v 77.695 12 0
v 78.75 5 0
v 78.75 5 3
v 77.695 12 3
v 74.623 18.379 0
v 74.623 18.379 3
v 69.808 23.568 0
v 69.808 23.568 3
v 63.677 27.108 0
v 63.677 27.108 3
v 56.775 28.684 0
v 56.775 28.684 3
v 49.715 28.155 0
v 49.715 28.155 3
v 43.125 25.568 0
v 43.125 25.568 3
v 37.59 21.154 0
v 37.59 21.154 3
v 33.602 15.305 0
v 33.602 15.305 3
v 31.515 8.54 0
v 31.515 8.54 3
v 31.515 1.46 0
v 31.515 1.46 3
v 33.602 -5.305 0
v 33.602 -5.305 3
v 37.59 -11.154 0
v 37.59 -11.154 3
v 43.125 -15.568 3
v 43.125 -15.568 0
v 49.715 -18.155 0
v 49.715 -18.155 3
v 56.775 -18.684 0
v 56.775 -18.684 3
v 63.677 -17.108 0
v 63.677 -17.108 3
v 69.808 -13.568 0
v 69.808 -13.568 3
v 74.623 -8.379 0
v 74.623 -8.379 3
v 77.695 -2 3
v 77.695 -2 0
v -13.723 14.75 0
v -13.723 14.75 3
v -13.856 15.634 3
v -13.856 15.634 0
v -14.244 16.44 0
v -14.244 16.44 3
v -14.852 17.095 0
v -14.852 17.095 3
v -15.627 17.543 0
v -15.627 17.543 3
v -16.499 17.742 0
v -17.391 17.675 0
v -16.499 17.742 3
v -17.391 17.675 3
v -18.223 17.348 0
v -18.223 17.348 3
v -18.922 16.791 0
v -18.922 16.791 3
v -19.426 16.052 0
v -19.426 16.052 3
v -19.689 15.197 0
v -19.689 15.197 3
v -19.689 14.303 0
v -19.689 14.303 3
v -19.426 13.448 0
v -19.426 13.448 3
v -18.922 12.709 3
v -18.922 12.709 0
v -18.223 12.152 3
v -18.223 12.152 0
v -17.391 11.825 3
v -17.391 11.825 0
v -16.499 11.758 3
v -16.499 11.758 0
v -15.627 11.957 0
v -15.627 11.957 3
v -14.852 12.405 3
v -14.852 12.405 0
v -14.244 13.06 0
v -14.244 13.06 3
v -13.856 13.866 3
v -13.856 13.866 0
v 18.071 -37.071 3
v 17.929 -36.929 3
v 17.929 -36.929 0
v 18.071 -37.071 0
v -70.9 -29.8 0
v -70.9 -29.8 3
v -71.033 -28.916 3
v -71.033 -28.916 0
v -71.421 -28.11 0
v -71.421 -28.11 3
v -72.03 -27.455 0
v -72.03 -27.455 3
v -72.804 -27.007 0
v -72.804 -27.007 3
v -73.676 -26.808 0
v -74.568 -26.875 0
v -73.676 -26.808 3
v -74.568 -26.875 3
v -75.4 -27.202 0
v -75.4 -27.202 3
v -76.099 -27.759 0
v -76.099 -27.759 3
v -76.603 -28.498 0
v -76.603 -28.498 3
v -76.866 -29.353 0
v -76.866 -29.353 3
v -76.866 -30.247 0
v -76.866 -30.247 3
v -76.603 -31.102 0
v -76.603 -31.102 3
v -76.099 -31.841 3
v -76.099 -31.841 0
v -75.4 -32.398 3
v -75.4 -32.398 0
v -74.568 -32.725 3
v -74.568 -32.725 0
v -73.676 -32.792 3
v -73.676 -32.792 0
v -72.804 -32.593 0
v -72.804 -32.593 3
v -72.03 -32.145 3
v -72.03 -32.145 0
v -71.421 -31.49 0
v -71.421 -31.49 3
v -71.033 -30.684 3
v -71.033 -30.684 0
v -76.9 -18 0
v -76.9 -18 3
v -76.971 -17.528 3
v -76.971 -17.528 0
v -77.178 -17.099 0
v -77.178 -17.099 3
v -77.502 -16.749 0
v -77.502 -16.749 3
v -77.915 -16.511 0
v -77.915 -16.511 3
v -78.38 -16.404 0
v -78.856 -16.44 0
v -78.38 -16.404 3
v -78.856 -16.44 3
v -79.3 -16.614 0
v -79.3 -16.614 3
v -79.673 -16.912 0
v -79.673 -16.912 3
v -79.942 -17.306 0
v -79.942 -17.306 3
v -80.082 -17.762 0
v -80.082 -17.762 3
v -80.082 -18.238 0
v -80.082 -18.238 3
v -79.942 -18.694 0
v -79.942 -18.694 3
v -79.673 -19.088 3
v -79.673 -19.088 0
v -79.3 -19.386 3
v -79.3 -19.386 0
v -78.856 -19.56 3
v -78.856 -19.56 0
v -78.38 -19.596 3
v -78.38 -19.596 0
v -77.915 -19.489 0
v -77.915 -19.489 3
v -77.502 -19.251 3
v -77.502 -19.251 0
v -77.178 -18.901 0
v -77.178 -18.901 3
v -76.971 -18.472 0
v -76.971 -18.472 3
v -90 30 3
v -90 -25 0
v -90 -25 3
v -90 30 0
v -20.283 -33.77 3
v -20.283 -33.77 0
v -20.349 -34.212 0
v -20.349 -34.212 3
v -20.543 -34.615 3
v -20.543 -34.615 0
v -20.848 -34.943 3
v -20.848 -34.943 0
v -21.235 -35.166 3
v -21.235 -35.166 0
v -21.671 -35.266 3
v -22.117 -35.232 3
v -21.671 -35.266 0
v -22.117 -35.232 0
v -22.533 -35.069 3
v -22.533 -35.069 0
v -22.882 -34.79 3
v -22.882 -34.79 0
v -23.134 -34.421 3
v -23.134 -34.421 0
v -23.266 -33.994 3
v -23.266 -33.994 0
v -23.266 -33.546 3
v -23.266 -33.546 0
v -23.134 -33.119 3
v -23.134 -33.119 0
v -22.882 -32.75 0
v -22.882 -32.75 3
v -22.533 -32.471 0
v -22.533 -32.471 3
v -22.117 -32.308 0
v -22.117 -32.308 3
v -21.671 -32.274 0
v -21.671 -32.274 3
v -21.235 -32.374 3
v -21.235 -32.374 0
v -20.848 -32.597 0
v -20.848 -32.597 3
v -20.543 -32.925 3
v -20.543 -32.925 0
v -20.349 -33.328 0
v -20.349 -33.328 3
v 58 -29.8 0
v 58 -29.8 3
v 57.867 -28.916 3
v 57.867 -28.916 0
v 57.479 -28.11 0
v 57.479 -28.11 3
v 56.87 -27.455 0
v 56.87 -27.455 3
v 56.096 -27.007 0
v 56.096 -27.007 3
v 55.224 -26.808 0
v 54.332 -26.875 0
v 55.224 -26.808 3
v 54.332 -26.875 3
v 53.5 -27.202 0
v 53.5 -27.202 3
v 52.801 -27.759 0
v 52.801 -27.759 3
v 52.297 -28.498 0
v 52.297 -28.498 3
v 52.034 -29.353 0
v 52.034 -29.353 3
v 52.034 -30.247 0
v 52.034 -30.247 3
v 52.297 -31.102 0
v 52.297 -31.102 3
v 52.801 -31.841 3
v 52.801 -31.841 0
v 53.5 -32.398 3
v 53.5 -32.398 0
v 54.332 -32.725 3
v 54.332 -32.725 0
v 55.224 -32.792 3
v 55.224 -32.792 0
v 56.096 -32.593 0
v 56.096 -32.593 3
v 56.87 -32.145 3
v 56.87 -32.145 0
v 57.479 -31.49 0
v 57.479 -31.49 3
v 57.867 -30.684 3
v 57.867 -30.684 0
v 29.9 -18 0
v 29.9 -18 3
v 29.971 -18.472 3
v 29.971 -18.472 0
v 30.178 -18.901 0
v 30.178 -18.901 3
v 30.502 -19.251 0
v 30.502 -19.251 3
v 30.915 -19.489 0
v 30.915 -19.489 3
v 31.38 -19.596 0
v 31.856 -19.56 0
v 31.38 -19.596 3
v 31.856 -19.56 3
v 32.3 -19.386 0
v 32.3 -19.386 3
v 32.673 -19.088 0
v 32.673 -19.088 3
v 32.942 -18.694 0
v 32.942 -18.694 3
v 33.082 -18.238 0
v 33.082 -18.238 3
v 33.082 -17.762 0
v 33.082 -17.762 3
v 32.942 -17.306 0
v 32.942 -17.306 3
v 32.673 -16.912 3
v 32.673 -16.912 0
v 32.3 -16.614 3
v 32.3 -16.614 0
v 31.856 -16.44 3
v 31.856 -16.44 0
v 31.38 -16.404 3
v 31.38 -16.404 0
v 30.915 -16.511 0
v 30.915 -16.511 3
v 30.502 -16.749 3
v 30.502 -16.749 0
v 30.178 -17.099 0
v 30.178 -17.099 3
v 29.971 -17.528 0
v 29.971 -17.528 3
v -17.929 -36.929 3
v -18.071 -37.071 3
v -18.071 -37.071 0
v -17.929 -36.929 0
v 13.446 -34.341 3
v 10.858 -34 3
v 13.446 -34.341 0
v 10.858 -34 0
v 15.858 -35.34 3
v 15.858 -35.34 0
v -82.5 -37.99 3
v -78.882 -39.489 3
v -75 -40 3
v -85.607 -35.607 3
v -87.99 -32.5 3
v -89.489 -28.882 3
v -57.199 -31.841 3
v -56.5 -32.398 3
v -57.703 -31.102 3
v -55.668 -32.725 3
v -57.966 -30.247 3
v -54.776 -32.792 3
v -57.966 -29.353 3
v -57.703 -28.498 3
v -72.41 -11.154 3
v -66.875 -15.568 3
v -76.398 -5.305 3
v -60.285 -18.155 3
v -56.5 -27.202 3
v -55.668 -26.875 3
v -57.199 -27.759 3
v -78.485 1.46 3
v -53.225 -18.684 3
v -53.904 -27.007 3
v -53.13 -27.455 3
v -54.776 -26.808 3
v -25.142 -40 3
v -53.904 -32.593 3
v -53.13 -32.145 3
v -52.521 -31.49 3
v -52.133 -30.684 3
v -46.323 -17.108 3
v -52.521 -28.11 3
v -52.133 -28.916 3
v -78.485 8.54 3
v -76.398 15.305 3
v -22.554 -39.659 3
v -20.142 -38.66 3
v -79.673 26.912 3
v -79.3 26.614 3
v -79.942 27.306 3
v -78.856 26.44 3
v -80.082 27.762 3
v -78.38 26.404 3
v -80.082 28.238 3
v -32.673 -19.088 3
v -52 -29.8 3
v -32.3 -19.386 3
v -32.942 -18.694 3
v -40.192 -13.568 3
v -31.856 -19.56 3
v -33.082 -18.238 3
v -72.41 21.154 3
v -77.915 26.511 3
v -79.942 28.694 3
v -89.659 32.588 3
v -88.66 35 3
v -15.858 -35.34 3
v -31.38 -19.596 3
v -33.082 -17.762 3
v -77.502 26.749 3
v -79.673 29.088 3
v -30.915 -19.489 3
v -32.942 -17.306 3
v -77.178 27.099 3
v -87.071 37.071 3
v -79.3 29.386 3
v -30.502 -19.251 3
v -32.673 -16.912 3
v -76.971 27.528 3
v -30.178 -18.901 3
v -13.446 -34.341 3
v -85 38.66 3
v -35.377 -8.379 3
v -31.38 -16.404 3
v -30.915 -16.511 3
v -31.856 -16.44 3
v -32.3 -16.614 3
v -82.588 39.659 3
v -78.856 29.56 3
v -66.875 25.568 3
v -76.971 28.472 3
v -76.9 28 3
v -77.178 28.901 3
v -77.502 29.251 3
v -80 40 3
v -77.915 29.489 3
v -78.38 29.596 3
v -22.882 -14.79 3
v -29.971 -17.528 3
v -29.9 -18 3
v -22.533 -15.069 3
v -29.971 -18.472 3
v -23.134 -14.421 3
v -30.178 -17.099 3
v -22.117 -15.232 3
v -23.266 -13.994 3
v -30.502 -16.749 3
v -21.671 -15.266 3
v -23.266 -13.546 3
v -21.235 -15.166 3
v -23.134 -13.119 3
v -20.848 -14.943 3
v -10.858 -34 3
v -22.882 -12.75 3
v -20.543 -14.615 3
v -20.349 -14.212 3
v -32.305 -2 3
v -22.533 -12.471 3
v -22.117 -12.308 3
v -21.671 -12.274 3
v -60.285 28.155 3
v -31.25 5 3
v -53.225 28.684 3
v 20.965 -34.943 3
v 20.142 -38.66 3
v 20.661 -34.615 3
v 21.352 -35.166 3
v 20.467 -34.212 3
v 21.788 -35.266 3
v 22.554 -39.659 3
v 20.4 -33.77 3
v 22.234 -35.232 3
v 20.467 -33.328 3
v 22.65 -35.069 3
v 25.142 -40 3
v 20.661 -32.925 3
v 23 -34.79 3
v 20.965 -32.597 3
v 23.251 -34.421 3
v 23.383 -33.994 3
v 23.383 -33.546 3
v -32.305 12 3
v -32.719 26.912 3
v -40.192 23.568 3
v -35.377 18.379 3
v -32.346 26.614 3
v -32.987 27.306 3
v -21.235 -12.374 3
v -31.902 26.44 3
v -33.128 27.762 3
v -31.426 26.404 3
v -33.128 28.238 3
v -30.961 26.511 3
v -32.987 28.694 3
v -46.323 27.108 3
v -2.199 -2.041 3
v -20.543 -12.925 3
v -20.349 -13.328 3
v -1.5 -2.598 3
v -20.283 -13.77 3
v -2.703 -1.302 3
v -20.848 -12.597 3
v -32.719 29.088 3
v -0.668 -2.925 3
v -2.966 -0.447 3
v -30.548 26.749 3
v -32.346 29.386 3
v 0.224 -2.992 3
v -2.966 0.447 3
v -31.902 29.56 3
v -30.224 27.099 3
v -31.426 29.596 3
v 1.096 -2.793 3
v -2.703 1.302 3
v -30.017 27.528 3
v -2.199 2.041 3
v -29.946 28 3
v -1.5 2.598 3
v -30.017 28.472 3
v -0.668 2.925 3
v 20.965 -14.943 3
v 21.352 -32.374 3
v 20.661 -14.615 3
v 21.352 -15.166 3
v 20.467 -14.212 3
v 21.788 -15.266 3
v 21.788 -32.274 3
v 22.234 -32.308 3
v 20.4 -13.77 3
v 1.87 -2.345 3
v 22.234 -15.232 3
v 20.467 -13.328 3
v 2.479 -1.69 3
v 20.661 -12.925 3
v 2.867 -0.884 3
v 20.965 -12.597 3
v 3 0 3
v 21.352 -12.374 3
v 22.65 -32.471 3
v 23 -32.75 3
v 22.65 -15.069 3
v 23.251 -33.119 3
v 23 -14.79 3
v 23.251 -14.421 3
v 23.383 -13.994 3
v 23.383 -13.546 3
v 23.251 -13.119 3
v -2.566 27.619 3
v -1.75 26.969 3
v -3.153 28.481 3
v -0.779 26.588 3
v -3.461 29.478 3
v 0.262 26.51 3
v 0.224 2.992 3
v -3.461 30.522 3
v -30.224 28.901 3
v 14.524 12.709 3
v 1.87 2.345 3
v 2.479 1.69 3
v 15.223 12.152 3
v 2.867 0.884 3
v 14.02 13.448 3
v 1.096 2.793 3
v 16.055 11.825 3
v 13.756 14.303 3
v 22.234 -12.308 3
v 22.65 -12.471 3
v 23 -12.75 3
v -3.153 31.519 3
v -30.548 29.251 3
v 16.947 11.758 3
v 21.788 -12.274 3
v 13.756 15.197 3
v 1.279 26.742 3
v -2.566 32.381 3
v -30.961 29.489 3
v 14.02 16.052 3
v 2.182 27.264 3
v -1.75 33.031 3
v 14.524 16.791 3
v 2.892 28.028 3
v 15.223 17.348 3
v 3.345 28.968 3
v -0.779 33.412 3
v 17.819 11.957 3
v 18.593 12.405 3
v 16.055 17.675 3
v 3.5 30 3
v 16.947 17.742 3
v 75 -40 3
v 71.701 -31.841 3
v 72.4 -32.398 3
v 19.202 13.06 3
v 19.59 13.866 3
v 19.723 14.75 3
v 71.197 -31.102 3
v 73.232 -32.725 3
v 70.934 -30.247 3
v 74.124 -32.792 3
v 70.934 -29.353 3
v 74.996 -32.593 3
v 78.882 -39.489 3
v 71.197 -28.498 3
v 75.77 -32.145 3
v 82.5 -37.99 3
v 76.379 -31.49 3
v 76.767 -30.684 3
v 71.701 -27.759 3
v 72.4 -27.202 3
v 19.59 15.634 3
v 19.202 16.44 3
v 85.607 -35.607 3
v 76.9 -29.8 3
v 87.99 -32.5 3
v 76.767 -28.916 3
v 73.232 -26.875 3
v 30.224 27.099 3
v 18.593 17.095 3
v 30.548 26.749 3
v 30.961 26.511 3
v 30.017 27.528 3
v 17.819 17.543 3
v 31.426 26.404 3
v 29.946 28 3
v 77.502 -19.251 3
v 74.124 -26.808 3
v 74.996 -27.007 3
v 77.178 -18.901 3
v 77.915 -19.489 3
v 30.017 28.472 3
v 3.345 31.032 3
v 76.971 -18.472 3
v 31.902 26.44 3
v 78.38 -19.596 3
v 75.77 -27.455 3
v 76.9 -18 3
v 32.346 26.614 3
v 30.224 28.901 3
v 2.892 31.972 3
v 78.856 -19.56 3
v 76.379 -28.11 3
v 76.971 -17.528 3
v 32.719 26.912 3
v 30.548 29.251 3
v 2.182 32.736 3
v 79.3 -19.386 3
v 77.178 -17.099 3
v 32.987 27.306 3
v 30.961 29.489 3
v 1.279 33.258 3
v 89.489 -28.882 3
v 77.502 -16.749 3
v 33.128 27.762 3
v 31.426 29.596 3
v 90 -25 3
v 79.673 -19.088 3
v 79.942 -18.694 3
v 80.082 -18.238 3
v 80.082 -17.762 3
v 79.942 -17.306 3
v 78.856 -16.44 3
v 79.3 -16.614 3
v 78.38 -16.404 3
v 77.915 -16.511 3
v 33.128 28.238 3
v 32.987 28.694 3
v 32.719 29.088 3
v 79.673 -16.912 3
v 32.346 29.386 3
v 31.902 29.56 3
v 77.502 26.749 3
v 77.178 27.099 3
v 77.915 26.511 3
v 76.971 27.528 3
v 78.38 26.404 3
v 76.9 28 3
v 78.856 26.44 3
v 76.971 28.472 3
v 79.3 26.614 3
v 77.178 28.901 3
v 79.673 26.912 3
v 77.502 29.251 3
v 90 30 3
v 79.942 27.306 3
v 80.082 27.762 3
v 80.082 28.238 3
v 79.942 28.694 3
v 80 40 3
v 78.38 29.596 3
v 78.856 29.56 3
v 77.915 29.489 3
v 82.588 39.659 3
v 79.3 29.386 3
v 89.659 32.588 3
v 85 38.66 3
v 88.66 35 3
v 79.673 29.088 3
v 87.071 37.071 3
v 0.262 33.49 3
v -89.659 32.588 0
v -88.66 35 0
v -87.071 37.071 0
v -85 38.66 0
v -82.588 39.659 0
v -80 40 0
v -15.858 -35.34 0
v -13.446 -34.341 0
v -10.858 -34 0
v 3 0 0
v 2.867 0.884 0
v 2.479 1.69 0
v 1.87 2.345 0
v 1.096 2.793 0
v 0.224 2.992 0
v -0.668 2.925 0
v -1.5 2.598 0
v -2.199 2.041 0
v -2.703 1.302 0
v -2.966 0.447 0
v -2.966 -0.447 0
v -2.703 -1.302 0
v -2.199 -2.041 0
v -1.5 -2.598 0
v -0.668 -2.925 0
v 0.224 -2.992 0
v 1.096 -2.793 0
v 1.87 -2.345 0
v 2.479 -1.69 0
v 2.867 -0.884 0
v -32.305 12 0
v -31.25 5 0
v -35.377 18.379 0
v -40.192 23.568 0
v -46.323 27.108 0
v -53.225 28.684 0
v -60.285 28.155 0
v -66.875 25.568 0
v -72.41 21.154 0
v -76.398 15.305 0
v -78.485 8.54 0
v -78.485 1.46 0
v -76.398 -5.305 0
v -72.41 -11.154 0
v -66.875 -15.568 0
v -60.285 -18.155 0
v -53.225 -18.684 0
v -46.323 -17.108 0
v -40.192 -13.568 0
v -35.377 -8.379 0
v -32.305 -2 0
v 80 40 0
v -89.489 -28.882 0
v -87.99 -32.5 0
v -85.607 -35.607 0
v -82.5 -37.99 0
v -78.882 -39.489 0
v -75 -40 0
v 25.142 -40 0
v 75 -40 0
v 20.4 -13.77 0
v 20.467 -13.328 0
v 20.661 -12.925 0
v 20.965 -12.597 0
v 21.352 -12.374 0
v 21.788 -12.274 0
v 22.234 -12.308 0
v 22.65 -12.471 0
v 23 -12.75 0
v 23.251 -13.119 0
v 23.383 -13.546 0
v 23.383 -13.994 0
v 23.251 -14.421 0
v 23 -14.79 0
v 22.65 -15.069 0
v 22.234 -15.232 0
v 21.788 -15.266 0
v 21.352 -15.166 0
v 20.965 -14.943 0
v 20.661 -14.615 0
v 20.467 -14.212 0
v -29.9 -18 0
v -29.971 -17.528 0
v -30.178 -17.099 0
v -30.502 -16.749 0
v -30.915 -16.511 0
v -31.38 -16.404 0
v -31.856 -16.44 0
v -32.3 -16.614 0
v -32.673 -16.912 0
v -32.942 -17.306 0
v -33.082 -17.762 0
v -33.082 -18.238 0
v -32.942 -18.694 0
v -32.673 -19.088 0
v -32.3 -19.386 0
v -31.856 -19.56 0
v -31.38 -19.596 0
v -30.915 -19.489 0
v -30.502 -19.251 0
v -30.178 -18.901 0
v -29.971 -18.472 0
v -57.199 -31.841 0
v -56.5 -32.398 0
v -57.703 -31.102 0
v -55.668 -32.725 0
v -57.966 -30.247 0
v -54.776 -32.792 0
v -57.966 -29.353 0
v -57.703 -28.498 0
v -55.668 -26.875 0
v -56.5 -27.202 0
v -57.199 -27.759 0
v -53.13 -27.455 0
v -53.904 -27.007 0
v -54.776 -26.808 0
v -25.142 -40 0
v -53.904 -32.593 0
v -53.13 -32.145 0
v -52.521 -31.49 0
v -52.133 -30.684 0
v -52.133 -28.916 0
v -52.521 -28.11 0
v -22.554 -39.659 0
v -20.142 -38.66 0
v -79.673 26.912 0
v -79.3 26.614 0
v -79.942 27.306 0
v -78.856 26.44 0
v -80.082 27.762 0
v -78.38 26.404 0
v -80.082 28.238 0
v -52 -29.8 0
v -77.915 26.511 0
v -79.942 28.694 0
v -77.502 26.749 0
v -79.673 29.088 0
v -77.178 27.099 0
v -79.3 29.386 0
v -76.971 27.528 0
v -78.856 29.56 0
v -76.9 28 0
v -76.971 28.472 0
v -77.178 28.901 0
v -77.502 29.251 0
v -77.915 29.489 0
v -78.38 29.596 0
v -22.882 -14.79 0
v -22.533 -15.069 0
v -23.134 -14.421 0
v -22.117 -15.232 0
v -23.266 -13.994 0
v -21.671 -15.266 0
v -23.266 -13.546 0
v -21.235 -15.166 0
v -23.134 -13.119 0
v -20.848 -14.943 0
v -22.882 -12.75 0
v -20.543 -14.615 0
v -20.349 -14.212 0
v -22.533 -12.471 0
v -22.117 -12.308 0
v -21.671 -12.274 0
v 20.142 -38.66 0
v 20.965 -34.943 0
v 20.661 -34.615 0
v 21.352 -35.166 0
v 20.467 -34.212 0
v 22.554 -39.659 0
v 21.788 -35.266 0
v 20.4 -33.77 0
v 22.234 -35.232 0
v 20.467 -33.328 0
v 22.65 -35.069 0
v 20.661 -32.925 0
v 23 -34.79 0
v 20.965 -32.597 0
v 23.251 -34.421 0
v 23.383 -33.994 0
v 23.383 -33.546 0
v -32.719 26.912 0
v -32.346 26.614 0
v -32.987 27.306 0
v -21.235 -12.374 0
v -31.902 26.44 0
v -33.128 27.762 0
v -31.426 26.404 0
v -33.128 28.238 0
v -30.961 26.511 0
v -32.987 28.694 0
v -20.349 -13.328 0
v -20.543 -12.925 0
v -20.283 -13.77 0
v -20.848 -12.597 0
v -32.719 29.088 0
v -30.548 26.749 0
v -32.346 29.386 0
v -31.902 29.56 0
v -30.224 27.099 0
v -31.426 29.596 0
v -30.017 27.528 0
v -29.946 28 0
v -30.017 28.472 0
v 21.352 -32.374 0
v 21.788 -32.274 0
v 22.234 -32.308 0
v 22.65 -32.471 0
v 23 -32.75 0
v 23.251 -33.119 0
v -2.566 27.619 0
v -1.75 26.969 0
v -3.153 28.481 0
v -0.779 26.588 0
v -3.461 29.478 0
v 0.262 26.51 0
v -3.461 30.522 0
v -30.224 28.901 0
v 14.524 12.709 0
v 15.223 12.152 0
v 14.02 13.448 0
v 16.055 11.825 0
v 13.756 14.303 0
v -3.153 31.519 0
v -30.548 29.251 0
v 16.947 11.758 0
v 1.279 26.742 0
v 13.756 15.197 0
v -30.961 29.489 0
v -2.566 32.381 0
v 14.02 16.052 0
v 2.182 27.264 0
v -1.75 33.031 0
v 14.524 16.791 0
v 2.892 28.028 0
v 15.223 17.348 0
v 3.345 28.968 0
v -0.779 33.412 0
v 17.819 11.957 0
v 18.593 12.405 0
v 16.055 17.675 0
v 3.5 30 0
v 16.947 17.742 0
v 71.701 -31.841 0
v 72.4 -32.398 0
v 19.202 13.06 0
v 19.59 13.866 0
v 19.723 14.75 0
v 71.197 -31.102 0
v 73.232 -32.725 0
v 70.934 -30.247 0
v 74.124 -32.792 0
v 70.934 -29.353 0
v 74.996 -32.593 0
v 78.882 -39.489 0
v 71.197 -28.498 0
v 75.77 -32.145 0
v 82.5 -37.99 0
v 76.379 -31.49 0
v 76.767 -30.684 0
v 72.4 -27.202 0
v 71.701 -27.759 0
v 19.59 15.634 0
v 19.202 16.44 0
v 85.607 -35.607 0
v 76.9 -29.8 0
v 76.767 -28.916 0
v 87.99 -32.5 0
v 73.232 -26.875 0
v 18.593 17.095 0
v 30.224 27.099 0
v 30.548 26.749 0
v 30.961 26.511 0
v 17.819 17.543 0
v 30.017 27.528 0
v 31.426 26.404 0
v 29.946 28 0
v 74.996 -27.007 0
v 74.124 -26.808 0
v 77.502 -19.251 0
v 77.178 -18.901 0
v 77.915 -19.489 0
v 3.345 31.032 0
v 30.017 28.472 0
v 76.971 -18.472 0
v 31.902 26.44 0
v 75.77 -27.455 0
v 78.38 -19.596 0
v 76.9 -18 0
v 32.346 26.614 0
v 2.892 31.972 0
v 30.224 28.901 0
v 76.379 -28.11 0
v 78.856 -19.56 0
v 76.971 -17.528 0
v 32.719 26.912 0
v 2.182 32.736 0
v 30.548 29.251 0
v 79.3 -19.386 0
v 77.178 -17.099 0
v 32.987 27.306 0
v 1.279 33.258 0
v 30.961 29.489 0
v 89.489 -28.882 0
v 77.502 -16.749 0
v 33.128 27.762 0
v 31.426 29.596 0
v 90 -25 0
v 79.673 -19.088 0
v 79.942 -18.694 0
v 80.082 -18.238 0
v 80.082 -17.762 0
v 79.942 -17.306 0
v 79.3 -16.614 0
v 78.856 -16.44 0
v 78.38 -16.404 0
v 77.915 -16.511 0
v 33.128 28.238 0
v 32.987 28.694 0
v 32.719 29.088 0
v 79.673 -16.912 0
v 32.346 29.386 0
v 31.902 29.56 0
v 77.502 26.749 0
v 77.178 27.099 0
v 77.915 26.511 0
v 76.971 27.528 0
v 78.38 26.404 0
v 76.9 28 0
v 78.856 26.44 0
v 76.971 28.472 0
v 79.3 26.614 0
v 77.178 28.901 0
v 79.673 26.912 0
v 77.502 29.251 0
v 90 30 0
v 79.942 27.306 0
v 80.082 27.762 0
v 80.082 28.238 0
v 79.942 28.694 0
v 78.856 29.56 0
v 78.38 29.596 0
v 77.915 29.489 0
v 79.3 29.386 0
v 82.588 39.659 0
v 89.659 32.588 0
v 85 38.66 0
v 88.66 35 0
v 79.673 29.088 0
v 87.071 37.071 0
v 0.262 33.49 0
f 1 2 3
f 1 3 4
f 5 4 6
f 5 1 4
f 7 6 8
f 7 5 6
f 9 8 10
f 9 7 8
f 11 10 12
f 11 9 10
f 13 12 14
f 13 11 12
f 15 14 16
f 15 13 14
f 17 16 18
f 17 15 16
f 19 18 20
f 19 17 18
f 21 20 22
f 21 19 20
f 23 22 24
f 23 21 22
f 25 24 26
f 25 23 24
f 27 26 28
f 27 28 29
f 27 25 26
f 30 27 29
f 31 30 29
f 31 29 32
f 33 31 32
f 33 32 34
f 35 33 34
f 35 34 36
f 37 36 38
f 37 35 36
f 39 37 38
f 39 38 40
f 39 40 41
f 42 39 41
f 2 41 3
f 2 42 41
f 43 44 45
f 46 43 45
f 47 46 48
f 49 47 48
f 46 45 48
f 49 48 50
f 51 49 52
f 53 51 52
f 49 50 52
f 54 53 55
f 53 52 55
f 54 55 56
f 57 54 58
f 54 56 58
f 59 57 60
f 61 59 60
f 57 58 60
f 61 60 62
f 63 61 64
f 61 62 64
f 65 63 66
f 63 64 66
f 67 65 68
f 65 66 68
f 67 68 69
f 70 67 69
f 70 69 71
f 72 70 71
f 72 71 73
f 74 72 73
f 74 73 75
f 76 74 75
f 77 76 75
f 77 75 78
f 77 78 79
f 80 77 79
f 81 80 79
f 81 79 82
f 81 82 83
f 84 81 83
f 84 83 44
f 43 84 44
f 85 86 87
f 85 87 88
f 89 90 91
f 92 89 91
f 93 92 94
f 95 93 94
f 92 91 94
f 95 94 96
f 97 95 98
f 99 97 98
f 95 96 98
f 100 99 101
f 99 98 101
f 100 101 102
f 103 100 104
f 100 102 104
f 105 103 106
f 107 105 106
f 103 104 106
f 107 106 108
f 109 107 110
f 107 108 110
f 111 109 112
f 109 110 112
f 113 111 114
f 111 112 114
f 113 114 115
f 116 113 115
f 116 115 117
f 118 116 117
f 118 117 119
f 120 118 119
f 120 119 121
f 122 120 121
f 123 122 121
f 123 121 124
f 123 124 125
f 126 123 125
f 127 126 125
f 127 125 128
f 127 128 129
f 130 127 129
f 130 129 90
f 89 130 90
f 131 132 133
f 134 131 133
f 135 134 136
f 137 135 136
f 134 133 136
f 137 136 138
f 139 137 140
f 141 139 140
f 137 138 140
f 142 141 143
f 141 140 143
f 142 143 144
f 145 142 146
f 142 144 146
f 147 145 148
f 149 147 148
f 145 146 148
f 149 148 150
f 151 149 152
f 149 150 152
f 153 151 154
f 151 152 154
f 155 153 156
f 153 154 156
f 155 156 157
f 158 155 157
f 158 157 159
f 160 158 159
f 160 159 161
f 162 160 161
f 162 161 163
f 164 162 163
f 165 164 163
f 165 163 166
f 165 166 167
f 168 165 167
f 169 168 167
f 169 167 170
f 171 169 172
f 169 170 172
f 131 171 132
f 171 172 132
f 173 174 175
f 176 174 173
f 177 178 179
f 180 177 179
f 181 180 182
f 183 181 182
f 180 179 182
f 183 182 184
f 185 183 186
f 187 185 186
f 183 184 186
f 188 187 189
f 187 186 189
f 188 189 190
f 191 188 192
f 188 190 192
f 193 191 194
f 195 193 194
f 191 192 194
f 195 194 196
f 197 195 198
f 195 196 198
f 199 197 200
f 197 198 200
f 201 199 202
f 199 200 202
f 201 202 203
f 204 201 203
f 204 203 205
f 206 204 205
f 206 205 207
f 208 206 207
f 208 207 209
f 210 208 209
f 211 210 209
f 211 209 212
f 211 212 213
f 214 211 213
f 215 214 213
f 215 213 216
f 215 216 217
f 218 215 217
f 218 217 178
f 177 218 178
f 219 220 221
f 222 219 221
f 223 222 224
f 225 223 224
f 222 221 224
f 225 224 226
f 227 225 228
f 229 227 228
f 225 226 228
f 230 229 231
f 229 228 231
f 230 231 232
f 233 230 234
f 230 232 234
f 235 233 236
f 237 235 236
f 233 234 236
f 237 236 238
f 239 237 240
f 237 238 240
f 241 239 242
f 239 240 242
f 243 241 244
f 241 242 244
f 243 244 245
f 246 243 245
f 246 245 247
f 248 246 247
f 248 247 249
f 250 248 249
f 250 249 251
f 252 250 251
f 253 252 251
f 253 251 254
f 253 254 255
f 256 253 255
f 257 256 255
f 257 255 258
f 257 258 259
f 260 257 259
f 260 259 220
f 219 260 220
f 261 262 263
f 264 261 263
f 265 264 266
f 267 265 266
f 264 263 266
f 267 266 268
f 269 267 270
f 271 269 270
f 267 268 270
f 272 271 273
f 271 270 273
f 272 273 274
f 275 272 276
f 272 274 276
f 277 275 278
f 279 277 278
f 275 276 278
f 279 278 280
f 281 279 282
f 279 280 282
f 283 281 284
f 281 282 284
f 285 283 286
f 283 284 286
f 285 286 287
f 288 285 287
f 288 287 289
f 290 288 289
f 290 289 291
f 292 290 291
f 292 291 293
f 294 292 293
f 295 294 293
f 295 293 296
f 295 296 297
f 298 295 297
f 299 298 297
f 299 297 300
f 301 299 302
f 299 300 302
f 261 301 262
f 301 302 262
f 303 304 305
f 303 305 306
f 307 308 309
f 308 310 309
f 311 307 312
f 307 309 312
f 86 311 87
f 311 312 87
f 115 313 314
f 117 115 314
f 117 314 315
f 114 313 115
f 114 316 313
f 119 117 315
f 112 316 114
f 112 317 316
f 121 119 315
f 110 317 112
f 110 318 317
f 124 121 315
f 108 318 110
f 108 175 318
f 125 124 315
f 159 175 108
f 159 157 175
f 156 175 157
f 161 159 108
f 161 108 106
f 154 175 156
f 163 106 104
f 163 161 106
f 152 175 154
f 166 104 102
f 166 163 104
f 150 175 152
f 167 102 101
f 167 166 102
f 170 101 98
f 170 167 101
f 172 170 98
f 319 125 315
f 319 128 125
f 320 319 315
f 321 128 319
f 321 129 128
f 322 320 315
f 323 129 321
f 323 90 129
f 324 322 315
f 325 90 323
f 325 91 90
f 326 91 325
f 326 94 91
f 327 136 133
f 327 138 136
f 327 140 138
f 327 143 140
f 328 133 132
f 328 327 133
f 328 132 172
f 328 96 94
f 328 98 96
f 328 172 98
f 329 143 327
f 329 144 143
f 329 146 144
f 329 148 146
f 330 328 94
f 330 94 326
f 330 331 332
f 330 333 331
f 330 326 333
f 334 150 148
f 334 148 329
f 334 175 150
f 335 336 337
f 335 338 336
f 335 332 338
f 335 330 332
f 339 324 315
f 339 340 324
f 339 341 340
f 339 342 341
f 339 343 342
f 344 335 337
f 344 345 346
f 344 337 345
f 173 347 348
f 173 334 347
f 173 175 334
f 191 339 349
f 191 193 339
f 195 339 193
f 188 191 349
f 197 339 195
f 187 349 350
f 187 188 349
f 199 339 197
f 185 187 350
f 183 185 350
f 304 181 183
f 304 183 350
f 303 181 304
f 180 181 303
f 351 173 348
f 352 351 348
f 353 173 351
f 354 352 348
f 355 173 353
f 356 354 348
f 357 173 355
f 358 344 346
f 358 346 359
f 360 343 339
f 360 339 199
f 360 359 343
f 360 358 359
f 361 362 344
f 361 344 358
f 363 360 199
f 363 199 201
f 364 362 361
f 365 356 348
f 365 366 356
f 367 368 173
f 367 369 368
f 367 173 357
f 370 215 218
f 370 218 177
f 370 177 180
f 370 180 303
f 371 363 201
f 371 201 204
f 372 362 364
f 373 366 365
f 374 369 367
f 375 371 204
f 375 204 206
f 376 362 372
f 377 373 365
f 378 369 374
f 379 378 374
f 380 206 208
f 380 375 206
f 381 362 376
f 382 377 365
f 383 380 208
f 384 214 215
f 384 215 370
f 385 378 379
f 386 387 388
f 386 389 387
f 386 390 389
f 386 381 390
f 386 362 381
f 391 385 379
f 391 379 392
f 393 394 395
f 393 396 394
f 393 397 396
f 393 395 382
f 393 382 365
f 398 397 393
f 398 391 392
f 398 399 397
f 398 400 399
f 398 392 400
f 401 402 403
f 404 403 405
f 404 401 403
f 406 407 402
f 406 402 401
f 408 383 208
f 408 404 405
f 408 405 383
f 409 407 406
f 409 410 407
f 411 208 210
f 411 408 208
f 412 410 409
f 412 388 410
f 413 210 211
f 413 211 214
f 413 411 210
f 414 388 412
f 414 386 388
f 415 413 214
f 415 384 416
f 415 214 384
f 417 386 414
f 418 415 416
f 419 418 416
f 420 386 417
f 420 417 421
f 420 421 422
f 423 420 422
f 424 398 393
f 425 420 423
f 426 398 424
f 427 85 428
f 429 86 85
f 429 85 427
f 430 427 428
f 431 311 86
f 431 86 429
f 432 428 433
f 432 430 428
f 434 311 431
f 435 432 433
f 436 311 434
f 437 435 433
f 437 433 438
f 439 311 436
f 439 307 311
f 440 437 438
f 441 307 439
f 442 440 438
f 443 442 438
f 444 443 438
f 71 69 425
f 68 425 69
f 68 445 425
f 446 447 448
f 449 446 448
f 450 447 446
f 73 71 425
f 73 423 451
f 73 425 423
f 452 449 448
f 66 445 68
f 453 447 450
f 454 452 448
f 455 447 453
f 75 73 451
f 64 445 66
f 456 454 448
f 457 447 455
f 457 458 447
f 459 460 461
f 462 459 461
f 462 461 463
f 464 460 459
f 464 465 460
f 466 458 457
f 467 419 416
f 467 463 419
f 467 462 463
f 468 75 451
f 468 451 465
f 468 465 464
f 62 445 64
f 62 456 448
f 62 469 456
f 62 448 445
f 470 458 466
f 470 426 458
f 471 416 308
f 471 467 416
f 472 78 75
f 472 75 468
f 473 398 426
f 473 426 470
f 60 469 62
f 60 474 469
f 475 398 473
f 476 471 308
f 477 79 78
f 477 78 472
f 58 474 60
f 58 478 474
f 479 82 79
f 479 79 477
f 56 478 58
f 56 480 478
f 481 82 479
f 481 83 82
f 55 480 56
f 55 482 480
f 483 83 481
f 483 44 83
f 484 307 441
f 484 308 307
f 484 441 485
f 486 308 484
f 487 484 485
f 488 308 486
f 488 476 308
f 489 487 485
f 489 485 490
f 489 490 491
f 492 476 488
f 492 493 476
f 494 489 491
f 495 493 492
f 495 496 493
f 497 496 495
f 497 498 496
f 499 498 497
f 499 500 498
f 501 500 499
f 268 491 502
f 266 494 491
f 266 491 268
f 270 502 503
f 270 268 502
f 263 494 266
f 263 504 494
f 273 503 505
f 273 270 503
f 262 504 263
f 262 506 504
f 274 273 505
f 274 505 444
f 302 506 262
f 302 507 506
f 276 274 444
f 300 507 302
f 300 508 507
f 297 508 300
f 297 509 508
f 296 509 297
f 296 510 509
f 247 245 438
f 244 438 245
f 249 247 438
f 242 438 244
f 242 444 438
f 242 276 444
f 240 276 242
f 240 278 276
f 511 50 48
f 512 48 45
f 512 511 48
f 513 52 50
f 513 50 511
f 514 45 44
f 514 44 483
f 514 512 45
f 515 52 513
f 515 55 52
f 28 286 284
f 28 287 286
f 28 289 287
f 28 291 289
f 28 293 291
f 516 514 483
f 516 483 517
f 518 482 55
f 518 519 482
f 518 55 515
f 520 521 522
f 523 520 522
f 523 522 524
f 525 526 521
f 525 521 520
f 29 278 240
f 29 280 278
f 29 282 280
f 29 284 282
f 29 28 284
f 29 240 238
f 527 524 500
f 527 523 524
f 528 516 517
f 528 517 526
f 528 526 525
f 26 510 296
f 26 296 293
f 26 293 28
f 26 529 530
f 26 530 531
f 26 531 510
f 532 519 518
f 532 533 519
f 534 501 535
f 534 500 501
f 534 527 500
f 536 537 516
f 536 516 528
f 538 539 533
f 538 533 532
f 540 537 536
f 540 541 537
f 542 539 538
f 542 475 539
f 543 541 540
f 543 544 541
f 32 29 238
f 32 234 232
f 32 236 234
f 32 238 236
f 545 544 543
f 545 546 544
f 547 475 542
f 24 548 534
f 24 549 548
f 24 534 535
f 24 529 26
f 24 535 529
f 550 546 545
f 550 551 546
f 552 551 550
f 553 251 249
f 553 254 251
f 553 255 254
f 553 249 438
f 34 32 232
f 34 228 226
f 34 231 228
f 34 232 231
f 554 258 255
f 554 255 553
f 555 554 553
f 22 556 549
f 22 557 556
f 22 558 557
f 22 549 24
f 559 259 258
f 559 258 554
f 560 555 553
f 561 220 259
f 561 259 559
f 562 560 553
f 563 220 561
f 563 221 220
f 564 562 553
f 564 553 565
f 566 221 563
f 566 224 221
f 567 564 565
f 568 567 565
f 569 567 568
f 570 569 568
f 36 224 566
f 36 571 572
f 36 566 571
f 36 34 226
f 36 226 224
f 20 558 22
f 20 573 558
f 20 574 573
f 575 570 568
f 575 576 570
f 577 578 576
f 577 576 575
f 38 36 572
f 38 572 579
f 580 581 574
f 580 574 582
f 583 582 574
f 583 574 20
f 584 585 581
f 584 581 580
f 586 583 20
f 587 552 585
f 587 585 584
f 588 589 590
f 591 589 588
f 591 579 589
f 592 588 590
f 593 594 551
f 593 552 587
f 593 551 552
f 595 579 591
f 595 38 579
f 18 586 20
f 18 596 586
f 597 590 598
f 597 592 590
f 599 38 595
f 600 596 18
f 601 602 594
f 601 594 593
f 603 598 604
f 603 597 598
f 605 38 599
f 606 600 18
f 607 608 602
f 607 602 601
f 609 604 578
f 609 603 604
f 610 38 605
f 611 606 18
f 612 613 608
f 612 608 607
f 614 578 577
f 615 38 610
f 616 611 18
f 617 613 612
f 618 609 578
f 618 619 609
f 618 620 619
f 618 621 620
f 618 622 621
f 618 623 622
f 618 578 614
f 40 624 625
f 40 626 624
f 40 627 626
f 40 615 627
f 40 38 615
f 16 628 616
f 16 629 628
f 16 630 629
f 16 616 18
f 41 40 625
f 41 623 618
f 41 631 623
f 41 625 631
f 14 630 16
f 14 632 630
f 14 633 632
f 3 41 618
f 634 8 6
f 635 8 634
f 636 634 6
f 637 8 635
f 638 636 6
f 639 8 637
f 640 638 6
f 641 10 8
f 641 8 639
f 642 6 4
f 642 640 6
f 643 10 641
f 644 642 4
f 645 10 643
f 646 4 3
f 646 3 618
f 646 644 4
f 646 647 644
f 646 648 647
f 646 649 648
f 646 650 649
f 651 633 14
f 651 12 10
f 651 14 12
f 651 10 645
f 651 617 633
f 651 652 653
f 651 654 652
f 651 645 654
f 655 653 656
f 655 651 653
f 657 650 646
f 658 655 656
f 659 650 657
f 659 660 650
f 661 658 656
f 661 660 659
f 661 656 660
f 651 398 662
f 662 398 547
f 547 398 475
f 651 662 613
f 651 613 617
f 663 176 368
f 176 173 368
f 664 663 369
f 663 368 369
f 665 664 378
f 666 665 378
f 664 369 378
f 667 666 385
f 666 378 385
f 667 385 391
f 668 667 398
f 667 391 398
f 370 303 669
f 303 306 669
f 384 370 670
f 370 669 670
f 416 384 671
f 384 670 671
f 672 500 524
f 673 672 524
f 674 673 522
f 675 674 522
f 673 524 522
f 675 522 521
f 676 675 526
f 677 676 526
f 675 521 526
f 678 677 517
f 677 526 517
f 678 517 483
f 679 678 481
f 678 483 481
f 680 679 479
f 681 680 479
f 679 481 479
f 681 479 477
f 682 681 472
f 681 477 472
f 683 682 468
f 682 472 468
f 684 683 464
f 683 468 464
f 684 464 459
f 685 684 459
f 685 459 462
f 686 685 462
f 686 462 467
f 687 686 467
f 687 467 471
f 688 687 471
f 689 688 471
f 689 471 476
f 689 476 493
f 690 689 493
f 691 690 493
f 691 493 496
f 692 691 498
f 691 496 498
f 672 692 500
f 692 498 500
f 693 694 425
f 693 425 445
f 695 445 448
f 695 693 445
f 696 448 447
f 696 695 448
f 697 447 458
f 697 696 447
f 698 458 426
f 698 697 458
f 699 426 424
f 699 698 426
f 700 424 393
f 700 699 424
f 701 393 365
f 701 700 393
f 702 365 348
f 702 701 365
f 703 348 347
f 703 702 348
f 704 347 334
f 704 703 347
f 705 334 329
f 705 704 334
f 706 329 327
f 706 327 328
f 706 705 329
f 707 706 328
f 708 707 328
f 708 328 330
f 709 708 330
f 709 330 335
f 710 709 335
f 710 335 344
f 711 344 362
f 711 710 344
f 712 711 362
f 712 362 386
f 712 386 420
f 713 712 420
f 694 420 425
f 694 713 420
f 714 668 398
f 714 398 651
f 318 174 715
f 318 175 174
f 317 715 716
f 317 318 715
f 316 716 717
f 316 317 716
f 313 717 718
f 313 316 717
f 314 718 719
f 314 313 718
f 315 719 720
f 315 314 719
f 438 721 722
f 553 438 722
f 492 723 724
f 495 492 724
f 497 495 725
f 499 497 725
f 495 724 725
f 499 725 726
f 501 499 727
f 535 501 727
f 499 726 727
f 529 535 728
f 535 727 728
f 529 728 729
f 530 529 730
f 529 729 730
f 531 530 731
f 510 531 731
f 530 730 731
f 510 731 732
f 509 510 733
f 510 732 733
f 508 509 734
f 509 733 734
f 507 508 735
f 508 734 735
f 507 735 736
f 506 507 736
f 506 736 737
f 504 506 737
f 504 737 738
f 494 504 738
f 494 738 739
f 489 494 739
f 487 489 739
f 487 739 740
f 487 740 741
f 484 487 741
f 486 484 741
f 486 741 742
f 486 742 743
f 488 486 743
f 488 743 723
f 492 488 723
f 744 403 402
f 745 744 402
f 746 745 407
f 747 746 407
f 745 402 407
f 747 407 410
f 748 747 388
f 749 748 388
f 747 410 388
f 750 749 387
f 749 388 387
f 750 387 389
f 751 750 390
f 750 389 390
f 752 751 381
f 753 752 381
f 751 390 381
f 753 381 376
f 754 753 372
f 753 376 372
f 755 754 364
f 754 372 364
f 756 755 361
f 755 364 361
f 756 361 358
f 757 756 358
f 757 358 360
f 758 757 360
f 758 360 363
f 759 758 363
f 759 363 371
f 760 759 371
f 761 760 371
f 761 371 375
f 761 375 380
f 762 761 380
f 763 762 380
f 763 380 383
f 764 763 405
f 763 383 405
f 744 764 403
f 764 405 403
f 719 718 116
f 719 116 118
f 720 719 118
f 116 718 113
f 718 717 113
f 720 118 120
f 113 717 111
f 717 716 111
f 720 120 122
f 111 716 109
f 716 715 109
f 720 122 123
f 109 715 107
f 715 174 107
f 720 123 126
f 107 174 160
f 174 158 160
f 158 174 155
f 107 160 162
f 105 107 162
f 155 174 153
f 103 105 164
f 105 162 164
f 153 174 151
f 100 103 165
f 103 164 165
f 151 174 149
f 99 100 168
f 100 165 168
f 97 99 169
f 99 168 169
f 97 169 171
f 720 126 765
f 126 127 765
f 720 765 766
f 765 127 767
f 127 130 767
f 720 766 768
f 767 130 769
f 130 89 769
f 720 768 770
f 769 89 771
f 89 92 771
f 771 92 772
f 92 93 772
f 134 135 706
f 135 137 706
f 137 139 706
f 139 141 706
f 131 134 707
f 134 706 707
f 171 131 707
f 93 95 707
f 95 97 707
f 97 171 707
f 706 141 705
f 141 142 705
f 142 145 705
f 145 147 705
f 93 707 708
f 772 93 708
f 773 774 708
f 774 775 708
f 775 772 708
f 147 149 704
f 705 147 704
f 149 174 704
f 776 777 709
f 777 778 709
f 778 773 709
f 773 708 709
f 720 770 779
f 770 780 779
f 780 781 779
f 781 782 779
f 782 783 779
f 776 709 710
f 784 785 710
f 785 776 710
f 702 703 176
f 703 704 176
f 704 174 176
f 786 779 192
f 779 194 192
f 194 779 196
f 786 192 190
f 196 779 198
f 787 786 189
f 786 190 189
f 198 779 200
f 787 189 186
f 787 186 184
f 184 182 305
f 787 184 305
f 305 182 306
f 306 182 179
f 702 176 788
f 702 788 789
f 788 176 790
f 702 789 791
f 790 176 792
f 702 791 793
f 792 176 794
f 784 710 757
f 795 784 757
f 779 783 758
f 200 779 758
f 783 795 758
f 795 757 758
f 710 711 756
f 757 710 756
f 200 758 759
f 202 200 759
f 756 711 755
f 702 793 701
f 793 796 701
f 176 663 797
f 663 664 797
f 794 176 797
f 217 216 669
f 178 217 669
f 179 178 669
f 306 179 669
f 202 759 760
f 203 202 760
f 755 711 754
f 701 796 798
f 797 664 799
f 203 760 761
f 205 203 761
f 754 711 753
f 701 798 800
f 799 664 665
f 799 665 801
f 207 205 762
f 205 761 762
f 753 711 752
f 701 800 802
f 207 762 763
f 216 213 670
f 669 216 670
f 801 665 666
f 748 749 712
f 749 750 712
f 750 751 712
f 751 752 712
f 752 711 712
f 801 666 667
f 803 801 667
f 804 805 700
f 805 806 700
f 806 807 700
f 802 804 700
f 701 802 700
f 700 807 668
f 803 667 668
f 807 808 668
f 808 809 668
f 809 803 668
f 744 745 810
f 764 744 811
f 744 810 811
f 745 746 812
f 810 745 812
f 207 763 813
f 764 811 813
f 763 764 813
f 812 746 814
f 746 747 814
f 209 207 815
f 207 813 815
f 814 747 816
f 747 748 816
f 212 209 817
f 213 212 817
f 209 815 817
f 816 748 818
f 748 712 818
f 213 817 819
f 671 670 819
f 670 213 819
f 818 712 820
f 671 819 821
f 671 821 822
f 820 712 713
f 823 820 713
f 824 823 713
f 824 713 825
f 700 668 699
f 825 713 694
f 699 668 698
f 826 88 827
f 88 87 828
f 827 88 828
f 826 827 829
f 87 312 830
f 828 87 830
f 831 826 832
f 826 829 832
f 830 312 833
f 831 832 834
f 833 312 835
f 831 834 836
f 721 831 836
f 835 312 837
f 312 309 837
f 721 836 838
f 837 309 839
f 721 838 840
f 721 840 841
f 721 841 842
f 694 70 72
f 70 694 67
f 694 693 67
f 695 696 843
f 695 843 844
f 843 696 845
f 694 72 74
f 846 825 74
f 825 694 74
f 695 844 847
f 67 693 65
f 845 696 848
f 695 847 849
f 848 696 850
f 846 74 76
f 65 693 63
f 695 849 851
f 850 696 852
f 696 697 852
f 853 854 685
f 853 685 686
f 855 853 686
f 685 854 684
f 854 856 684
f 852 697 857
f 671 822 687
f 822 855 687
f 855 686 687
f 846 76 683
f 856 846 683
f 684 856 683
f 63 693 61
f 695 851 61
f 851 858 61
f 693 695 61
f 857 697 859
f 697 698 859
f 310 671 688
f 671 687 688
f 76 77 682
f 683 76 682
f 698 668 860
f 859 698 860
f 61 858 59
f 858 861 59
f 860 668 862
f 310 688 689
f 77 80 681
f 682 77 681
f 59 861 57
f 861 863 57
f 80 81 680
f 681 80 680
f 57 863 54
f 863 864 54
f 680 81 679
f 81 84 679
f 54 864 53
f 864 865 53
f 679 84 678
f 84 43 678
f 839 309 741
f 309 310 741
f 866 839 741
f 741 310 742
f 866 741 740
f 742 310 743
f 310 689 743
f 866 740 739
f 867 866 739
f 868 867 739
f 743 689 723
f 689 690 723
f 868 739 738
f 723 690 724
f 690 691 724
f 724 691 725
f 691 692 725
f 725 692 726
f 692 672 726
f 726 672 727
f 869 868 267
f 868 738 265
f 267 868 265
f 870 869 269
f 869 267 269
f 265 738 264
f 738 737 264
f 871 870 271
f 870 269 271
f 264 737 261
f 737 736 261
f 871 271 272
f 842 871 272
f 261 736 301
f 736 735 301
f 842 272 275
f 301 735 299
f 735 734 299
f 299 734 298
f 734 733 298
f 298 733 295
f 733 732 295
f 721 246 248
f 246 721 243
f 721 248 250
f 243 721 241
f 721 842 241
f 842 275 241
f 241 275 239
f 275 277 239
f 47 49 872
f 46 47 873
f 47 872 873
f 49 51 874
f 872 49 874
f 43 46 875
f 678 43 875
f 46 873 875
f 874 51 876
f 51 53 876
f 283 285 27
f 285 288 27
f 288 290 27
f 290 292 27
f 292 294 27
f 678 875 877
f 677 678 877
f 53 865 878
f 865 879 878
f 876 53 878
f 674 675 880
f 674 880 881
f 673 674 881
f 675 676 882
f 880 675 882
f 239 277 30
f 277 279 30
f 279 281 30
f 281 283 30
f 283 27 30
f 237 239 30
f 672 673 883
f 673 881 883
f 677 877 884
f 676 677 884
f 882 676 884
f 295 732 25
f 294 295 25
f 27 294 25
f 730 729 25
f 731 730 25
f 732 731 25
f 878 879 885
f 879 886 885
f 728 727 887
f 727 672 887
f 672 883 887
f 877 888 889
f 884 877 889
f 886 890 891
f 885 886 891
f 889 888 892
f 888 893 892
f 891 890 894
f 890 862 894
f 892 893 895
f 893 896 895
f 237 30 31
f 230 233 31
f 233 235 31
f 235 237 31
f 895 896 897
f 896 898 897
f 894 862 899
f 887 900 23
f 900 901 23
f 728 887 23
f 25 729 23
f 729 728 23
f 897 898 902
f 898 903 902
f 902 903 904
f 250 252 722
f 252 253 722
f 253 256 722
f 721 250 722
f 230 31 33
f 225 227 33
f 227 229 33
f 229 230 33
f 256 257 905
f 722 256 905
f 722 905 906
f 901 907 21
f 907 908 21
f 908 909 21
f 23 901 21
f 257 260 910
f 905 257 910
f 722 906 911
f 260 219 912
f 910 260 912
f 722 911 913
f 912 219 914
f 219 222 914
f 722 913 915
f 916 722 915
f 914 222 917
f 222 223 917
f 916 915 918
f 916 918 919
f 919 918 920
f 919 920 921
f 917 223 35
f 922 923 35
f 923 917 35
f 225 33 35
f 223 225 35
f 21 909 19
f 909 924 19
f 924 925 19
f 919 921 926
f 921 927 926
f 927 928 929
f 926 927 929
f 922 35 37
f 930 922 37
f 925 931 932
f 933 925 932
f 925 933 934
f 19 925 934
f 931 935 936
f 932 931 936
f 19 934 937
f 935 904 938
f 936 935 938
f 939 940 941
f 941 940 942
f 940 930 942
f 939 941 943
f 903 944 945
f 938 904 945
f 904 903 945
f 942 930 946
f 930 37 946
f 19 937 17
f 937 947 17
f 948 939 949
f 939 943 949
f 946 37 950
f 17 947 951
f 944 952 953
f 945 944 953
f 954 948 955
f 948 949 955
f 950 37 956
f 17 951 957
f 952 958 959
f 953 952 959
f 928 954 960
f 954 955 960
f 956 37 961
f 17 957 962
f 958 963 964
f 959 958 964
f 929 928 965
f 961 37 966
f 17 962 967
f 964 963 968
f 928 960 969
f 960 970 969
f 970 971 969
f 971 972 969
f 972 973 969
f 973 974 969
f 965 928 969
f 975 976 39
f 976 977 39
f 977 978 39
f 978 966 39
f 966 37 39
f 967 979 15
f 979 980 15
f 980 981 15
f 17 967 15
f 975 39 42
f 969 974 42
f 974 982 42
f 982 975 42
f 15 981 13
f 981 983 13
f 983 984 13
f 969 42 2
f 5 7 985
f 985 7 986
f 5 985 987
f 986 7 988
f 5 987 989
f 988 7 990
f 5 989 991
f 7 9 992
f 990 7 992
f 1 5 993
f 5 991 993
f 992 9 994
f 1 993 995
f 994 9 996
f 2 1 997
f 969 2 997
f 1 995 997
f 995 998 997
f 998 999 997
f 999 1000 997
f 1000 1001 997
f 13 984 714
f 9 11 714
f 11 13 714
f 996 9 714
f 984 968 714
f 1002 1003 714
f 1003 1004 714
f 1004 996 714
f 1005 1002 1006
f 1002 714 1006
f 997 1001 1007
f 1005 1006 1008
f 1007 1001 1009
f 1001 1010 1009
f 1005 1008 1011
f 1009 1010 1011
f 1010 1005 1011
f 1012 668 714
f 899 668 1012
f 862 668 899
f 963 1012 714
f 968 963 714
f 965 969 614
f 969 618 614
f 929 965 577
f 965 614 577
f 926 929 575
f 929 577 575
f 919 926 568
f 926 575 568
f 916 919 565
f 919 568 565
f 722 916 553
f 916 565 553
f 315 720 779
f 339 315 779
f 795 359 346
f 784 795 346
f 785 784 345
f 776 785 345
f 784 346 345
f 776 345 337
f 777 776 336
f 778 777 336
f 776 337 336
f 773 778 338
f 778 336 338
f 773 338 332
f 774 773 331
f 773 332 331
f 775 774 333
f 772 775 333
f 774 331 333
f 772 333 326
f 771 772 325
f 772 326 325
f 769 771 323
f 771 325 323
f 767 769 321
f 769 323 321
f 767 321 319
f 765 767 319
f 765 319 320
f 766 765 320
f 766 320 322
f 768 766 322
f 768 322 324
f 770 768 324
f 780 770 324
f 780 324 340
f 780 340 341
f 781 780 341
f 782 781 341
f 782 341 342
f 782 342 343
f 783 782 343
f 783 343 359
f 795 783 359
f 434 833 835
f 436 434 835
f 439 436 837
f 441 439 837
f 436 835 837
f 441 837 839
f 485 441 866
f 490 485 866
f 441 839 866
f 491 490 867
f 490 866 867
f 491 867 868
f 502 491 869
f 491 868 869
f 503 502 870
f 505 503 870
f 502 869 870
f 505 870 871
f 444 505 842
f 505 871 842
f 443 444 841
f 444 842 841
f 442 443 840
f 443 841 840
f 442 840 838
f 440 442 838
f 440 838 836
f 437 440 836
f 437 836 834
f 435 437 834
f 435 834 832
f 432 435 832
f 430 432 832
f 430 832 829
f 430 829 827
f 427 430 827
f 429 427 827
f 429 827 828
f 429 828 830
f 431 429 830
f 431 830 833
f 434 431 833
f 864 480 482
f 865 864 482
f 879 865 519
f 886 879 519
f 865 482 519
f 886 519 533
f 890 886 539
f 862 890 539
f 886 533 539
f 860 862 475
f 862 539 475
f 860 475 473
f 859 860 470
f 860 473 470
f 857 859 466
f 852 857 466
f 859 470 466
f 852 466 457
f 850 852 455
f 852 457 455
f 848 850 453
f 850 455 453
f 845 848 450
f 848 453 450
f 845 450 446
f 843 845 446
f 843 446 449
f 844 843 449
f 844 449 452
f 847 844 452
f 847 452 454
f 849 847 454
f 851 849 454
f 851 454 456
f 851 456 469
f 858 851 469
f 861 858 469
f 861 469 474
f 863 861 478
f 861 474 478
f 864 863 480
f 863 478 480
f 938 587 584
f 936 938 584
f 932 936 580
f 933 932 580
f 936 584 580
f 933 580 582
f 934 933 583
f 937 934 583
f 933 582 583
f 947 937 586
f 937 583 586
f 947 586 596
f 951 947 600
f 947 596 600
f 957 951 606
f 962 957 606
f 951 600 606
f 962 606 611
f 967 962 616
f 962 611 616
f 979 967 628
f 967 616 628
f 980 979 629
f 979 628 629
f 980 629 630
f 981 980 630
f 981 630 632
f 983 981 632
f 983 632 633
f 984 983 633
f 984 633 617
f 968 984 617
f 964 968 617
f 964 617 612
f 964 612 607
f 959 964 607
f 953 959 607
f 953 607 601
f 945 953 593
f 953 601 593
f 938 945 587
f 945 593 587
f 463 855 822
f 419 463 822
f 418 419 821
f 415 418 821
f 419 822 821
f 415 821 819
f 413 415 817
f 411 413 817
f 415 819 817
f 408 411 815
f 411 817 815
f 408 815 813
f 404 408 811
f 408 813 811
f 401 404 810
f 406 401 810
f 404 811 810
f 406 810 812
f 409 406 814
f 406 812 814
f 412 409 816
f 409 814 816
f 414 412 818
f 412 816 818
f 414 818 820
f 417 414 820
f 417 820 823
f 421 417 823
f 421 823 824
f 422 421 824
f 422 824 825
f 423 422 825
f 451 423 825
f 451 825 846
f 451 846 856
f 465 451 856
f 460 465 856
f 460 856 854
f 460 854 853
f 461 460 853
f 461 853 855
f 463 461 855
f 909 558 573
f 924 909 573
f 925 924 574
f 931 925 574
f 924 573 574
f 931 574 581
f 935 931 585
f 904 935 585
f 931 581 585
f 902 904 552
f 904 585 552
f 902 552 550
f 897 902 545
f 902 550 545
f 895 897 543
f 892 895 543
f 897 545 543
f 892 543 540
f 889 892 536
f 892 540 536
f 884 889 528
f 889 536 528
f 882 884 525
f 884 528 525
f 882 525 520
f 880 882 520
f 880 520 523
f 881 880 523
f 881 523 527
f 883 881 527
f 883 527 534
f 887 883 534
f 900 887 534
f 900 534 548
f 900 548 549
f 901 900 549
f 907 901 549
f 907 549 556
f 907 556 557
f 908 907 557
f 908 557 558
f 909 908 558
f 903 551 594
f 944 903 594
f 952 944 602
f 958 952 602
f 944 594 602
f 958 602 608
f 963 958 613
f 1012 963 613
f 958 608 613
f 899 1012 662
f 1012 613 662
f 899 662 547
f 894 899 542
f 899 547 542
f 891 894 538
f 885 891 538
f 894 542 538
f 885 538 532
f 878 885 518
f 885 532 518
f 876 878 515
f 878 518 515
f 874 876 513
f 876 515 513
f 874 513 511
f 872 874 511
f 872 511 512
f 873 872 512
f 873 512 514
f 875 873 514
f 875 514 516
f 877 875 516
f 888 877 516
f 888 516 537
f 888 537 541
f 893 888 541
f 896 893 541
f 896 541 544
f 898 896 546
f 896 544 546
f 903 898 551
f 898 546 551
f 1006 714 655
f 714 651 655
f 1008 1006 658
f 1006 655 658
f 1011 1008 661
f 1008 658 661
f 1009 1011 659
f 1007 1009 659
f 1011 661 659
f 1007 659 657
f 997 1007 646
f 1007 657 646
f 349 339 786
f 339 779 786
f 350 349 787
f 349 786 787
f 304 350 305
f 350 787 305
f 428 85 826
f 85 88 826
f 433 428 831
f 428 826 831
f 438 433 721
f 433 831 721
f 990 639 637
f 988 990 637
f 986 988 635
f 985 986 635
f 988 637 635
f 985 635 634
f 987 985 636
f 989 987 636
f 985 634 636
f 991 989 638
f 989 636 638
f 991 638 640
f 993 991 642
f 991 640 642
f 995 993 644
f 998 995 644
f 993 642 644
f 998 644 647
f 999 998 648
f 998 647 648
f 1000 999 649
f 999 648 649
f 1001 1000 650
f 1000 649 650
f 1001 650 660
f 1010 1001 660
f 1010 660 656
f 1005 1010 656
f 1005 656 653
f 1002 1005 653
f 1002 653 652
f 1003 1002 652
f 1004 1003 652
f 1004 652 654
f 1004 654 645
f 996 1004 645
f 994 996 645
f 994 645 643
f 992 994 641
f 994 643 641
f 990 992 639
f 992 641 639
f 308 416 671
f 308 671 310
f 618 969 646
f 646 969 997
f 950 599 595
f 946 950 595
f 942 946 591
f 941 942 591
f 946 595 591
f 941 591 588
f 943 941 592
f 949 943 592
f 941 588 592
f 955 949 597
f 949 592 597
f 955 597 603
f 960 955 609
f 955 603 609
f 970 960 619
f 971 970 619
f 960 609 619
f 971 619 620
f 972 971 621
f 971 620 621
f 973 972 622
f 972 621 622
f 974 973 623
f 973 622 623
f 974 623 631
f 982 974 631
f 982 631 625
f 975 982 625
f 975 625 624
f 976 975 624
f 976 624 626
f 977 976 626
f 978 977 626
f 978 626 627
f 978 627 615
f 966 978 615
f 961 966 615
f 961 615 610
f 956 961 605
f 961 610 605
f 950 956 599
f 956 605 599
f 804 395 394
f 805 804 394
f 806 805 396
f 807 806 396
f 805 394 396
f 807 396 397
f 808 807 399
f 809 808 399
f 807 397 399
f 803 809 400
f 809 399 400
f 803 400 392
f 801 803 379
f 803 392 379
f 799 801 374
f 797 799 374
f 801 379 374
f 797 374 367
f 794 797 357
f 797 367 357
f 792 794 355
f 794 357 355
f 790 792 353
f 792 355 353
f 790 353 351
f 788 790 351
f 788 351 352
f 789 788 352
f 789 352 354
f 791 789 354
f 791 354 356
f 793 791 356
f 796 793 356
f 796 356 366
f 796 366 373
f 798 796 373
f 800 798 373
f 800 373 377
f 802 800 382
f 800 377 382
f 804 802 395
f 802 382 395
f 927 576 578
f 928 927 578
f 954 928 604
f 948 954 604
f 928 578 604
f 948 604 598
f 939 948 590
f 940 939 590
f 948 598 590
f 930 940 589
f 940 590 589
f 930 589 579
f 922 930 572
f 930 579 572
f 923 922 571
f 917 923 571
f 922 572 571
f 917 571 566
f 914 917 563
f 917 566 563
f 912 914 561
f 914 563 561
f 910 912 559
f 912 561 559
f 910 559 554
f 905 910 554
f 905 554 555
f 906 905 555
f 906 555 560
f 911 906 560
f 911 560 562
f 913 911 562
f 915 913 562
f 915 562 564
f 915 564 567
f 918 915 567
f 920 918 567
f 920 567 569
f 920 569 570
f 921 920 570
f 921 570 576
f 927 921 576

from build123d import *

# Parameters (mm, degrees)
SKETCH1_W           = 180
SKETCH1_H           = 80
SKETCH1_R           = 23.75
BOSS_EXTRUDE1_DEPTH = 3
CUT_EXTRUDE2_DEPTH  = 3
SKETCH4_R           = 1.6
CUT_EXTRUDE3_DEPTH  = 3
SKETCH7_R           = 3
SKETCH7_R_2         = 3.5
CUT_EXTRUDE4_DEPTH  = 3
FILLET1_R           = 10
FILLET2_R           = 15
FILLET3_R           = 10
SKETCH8_R           = 3
CUT_EXTRUDE6_DEPTH  = 10
SKETCH9_R           = 1.5
CUT_EXTRUDE7_DEPTH  = 10


with BuildPart() as part:
    # Sketch1 → Boss-Extrude1 (new body)
    with BuildSketch(Plane.XY):
        Rectangle(SKETCH1_W, SKETCH1_H)
        with Locations((55, 5)):
            Circle(SKETCH1_R, mode=Mode.SUBTRACT)
        with Locations((-55, 5)):
            Circle(SKETCH1_R, mode=Mode.SUBTRACT)
    extrude(amount=BOSS_EXTRUDE1_DEPTH)

    # Sketch3 → Cut-Extrude2 (cut)
    with BuildSketch(Plane.XY.offset(3)):
        Polygon((-21, -40), (-15, -34), (15, -34), (21, -40), align=None)
    extrude(amount=-CUT_EXTRUDE2_DEPTH, mode=Mode.SUBTRACT)

    # Sketch4 → Cut-Extrude3 (cut)
    with BuildSketch(Plane.XY.offset(3)):
        with Locations((-78.5, 28)):
            Circle(SKETCH4_R)
        with Locations((-31.545874822, 28)):
            Circle(SKETCH4_R)
        with Locations((-31.5, -18)):
            Circle(SKETCH4_R)
        with Locations((-78.5, -18)):
            Circle(SKETCH4_R)
        with Locations(Location((31.5, -18, 0), (0, 0, 180))):
            Circle(SKETCH4_R)
        with Locations(Location((31.545874822, 28, 0), (0, 0, 180))):
            Circle(SKETCH4_R)
        with Locations(Location((78.5, 28, 0), (0, 0, 180))):
            Circle(SKETCH4_R)
        with Locations(Location((78.5, -18, 0), (0, 0, 180))):
            Circle(SKETCH4_R)
    extrude(amount=-CUT_EXTRUDE3_DEPTH, mode=Mode.SUBTRACT)

    # Sketch7 → Cut-Extrude4 (cut)
    with BuildSketch(Plane.XY.offset(3)):
        Circle(SKETCH7_R)
        with Locations((0, 30)):
            Circle(SKETCH7_R_2)
    extrude(amount=-CUT_EXTRUDE4_DEPTH, mode=Mode.SUBTRACT)

    # Fillet1
    fillet1_edges = [part.edges().sort_by_distance(p)[0] for p in [
        (-90, 40, 1.5),
        (90, 40, 1.5),
    ]]
    fillet(fillet1_edges, radius=FILLET1_R)

    # Fillet2
    fillet2_edges = [part.edges().sort_by_distance(p)[0] for p in [
        (90, -40, 1.5),
        (-90, -40, 1.5),
    ]]
    fillet(fillet2_edges, radius=FILLET2_R)

    # Fillet3
    fillet3_edges = [part.edges().sort_by_distance(p)[0] for p in [
        (-15, -34, 1.5),
        (15, -34, 1.5),
        (21, -40, 1.5),
        (-21, -40, 1.5),
    ]]
    fillet(fillet3_edges, radius=FILLET3_R)

    # Sketch8 → Cut-Extrude6 (cut)
    with BuildSketch(Plane.XY.offset(3)):
        with Locations((-55, -29.8)):
            Circle(SKETCH8_R)
        with Locations((-73.9, -29.8)):
            Circle(SKETCH8_R)
        with Locations((55, -29.8)):
            Circle(SKETCH8_R)
        with Locations((73.9, -29.8)):
            Circle(SKETCH8_R)
        with Locations((-16.722937411, 14.75)):
            Circle(SKETCH8_R)
        with Locations((16.722937411, 14.75)):
            Circle(SKETCH8_R)
    extrude(amount=-CUT_EXTRUDE6_DEPTH, mode=Mode.SUBTRACT)

    # Sketch9 → Cut-Extrude7 (cut)
    with BuildSketch(Plane(origin=(0, 0, 0), x_dir=(-1, 0, 0), z_dir=(0, 0, -1))):
        with Locations((-21.9, -33.770050686)):
            Circle(SKETCH9_R)
        with Locations((-21.9, -13.770050686)):
            Circle(SKETCH9_R)
        with Locations(Location((21.782825633, -13.770050686, 0), (0, 0, 180))):
            Circle(SKETCH9_R)
        with Locations(Location((21.782825633, -33.770050686, 0), (0, 0, 180))):
            Circle(SKETCH9_R)
    extrude(amount=-CUT_EXTRUDE7_DEPTH, mode=Mode.SUBTRACT)


solid = part.part
